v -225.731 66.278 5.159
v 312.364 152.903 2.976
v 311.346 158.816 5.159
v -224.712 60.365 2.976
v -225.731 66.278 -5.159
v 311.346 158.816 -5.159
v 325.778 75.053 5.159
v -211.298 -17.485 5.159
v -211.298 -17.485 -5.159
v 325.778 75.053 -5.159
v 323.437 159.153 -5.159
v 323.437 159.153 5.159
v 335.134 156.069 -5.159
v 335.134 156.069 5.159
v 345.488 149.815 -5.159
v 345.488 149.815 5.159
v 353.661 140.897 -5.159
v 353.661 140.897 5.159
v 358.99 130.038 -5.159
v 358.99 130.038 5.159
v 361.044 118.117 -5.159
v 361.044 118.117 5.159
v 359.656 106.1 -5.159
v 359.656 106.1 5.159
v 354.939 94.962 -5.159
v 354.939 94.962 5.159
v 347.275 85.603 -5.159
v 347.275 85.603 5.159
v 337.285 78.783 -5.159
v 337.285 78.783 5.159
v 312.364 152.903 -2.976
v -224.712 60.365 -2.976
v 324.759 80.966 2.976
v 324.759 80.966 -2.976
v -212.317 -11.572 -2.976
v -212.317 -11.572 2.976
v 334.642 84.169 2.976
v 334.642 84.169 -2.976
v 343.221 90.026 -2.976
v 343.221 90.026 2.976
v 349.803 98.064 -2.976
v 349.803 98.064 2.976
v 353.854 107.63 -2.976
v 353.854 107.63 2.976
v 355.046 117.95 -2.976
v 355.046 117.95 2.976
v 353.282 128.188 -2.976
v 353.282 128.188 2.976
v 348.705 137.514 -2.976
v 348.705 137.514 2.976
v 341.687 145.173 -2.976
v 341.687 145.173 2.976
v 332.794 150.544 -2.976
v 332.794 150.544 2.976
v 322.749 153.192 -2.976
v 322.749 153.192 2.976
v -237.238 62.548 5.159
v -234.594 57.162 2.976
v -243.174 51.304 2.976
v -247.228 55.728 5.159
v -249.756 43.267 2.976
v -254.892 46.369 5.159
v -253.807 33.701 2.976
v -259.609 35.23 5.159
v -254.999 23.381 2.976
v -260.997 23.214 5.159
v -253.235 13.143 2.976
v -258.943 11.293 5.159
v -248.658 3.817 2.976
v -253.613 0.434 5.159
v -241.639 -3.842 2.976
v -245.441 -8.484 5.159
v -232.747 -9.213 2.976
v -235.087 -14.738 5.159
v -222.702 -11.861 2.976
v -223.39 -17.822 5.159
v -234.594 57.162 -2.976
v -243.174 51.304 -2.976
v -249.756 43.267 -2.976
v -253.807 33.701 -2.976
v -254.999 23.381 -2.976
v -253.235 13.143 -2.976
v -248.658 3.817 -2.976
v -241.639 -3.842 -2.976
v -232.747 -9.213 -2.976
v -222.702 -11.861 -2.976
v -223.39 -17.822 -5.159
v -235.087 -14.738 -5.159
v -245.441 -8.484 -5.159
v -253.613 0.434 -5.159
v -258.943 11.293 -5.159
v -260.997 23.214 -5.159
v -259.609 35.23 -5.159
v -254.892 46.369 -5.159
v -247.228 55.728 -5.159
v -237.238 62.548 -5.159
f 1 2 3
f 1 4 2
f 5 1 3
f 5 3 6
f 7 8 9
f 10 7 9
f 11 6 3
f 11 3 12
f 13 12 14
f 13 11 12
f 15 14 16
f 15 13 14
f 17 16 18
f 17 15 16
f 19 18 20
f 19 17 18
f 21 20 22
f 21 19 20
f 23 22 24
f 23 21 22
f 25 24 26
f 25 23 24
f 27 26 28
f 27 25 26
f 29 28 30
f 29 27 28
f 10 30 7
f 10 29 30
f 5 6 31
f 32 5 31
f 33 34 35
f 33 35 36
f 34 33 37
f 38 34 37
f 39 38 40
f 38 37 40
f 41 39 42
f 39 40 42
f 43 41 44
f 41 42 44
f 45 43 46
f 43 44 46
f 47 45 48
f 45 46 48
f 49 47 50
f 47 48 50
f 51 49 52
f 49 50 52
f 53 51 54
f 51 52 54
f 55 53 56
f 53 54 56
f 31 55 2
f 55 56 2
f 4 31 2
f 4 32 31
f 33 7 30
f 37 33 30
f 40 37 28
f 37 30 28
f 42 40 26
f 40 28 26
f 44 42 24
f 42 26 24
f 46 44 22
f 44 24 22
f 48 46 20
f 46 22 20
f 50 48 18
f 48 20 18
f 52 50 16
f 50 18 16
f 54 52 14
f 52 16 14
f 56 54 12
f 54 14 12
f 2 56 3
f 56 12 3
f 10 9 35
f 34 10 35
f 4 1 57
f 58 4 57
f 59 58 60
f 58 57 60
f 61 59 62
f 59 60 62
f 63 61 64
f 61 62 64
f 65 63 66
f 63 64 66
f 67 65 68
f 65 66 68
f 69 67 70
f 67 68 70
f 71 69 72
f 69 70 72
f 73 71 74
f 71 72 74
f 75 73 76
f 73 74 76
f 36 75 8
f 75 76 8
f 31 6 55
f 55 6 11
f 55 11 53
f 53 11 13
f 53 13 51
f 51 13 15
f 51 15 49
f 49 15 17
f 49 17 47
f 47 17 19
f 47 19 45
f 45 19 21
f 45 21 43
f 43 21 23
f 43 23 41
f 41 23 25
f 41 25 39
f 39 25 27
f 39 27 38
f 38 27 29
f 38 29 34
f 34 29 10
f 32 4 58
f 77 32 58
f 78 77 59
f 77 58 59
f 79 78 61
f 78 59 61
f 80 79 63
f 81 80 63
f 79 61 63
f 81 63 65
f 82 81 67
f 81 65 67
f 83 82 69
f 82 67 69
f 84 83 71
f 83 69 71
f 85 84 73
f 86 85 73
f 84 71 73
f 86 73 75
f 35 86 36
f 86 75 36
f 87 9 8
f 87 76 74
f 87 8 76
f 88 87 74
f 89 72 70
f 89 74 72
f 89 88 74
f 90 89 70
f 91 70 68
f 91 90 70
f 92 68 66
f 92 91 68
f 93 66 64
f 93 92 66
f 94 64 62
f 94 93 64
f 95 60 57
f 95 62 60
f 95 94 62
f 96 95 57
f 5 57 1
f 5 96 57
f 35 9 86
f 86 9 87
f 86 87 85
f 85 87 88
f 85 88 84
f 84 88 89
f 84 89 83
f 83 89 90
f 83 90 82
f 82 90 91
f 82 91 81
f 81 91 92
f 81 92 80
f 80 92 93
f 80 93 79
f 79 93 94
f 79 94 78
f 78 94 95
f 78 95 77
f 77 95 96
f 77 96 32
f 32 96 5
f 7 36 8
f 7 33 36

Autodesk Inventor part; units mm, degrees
ref_plane "YZ Plane" through (0, 0, 0) normal (1, 0, 0) x (0, 1, 0)
ref_plane "XZ Plane" through (0, 0, 0) normal (0, 1, 0) x (-1, 0, 0)
sketch "Sketch Path" plane through (0, 0, 0) normal (0, 0, 1) x (1, 0, 0)
  arc A0 (325.3537, 77.5154) -> (311.7698, 156.3537) centre (318.5618, 116.9345) ccw
  arc A1 (-225.3064, 63.8154) -> (-211.7226, -15.0229) centre (-218.5145, 24.3963) ccw
  line L0 (-225.3064, 63.8154) -> (311.7698, 156.3537)
  line L1 (325.3537, 77.5154) -> (-211.7226, -15.0229)
ref_plane "Cross Section Plane" through (311.7698, 156.3537, 0) normal (-0.9855, -0.1698, 0) x (0, 0, 1)
sketch "Cross Section" plane through (311.7698, 156.3537, 0) normal (-0.9855, -0.1698, 0) x (0, 0, 1)
  line L0 (0, 2.4986) -> (0, -3.5014) construction
  line L1 (-4.25, 0) -> (4.25, 0) construction
  line L2 (-5.1594, 2.4986) -> (5.1594, 2.4986)
  line L3 (5.1594, 2.4986) -> (2.9756, -3.5014)
  line L4 (2.9756, -3.5014) -> (-2.9756, -3.5014)
  line L5 (-2.9756, -3.5014) -> (-5.1594, 2.4986)
  point P0 (0, 0)
  point P1 (0, 0)
  point P2 (0, 0)
  dimension "d0" = 8.5
  dimension "d1" = 2.4986
  dimension "d2" = 40
  dimension "d3" = 6
sweep "Belt" add profiles "Cross Section" path "Sketch Path"
equation "\"d0\" = da_Bw"
equation "\"d1\" = da_Hw"
equation "\"d2\" = da_Alfa"
equation "\"d3\" = da_H"
equation "\"da_Alfa\" = 40deg"
equation "\"da_H\" = 6"
equation "\"da_Bw\" = 8.5"
equation "\"da_Hw\" = 2.49859"
properties part number "V-Belt" material "Rubber"
